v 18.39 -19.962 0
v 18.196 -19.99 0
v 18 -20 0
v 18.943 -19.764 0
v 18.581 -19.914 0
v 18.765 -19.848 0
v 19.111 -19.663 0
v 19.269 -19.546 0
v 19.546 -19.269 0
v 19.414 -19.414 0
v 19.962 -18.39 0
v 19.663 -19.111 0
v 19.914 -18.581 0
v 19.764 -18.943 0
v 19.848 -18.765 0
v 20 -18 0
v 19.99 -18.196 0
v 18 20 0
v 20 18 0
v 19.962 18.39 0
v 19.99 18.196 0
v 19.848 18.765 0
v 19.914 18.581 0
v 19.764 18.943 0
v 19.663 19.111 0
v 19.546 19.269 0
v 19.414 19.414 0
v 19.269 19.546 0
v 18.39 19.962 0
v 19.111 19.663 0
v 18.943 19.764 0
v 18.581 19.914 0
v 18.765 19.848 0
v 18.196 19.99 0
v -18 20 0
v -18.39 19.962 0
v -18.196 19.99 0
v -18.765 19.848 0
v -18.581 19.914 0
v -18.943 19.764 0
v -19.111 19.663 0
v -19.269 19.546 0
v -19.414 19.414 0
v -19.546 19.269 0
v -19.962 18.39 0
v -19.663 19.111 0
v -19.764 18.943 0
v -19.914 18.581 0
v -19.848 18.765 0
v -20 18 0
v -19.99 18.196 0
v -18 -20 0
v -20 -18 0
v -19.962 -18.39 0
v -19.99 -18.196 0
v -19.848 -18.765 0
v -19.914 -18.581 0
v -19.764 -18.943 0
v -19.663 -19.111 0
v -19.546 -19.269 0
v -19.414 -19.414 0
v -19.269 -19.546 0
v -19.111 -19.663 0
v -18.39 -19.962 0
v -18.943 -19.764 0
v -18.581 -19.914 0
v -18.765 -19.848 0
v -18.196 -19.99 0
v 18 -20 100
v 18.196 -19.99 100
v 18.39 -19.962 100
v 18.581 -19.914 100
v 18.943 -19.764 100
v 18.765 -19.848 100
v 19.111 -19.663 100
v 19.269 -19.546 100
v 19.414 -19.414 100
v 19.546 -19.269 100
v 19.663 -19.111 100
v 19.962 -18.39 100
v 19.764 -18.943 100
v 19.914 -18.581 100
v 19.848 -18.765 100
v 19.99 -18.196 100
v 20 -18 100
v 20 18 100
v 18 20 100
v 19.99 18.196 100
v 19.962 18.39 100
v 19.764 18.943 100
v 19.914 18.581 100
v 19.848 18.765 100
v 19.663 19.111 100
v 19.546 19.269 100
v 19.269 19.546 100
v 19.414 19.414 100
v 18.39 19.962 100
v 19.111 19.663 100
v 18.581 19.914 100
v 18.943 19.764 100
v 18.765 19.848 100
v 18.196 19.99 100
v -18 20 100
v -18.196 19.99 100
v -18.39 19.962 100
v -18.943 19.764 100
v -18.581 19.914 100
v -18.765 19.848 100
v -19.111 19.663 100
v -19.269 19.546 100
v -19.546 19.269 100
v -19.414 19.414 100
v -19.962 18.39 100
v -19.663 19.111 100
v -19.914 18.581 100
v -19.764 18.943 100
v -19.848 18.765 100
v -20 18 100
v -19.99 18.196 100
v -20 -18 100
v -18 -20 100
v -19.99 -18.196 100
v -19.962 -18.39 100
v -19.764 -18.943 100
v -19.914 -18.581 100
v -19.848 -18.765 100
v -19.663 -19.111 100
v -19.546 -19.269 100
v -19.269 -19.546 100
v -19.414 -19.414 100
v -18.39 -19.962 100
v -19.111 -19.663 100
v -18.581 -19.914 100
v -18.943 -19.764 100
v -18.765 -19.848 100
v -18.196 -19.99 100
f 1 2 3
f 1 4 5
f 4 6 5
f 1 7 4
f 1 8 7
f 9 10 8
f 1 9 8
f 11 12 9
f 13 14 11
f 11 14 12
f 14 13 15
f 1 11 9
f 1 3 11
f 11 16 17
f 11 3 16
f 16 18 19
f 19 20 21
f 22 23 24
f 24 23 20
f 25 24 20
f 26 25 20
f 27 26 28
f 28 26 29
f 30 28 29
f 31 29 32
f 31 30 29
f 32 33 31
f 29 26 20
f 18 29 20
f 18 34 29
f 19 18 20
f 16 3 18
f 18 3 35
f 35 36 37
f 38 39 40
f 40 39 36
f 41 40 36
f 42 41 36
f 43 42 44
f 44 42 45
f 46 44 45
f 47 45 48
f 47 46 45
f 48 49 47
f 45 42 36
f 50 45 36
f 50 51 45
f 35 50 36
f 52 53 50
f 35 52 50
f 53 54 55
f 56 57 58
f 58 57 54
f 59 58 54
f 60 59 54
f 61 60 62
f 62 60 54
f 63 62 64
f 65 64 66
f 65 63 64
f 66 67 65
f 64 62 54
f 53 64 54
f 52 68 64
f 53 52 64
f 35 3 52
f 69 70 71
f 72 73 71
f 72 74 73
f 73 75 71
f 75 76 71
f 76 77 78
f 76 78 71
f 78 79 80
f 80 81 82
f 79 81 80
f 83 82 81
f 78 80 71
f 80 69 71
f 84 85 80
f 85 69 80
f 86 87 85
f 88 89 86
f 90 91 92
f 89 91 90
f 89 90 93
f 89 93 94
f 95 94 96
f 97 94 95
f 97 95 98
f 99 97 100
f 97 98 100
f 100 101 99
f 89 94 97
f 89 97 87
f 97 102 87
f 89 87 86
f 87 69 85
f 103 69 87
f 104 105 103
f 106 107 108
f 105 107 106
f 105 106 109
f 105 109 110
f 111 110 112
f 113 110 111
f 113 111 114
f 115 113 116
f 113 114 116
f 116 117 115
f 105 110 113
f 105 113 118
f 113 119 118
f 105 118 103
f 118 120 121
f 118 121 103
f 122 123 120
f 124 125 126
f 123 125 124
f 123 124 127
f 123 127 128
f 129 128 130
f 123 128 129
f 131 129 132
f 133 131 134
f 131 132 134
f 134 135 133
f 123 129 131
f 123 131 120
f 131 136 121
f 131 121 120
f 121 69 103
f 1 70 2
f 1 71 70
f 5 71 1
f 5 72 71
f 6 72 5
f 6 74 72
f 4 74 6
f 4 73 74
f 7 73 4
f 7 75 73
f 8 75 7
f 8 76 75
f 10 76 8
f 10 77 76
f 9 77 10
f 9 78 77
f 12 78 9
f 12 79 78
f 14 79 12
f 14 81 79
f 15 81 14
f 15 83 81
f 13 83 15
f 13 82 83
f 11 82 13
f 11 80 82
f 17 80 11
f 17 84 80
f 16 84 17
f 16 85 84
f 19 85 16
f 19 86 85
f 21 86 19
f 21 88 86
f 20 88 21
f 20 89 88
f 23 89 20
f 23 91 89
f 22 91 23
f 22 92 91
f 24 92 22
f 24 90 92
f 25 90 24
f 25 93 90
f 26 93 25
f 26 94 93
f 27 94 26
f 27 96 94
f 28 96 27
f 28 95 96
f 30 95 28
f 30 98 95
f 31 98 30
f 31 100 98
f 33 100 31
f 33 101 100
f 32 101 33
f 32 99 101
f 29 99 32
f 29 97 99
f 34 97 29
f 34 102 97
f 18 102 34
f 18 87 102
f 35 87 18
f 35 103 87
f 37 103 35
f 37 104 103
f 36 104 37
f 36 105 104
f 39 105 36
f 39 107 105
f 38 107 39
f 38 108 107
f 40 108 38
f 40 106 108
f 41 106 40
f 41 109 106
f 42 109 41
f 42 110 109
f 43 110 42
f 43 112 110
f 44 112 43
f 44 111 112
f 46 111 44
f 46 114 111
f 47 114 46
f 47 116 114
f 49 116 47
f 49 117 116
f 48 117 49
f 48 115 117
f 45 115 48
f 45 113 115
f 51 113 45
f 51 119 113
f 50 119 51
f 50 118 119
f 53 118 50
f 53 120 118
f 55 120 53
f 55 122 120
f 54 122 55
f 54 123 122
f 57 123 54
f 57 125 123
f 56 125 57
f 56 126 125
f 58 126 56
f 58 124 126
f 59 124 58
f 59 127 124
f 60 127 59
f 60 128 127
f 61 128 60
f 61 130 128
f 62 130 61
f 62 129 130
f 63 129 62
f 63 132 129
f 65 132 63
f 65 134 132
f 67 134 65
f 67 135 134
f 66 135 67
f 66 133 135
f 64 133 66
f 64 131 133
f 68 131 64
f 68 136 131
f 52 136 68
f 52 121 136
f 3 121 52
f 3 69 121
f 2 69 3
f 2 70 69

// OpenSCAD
$fn = 64;

length = 100;
size = 40;
corner_r = 2;

module extrusion_40x40(len=100, s=40, r=2) {
    linear_extrude(height=len, center=false, convexity=10)
        offset(r=r)
            offset(delta=-r)
                square([s, s], center=true);
}

extrusion_40x40(length, size, corner_r);
